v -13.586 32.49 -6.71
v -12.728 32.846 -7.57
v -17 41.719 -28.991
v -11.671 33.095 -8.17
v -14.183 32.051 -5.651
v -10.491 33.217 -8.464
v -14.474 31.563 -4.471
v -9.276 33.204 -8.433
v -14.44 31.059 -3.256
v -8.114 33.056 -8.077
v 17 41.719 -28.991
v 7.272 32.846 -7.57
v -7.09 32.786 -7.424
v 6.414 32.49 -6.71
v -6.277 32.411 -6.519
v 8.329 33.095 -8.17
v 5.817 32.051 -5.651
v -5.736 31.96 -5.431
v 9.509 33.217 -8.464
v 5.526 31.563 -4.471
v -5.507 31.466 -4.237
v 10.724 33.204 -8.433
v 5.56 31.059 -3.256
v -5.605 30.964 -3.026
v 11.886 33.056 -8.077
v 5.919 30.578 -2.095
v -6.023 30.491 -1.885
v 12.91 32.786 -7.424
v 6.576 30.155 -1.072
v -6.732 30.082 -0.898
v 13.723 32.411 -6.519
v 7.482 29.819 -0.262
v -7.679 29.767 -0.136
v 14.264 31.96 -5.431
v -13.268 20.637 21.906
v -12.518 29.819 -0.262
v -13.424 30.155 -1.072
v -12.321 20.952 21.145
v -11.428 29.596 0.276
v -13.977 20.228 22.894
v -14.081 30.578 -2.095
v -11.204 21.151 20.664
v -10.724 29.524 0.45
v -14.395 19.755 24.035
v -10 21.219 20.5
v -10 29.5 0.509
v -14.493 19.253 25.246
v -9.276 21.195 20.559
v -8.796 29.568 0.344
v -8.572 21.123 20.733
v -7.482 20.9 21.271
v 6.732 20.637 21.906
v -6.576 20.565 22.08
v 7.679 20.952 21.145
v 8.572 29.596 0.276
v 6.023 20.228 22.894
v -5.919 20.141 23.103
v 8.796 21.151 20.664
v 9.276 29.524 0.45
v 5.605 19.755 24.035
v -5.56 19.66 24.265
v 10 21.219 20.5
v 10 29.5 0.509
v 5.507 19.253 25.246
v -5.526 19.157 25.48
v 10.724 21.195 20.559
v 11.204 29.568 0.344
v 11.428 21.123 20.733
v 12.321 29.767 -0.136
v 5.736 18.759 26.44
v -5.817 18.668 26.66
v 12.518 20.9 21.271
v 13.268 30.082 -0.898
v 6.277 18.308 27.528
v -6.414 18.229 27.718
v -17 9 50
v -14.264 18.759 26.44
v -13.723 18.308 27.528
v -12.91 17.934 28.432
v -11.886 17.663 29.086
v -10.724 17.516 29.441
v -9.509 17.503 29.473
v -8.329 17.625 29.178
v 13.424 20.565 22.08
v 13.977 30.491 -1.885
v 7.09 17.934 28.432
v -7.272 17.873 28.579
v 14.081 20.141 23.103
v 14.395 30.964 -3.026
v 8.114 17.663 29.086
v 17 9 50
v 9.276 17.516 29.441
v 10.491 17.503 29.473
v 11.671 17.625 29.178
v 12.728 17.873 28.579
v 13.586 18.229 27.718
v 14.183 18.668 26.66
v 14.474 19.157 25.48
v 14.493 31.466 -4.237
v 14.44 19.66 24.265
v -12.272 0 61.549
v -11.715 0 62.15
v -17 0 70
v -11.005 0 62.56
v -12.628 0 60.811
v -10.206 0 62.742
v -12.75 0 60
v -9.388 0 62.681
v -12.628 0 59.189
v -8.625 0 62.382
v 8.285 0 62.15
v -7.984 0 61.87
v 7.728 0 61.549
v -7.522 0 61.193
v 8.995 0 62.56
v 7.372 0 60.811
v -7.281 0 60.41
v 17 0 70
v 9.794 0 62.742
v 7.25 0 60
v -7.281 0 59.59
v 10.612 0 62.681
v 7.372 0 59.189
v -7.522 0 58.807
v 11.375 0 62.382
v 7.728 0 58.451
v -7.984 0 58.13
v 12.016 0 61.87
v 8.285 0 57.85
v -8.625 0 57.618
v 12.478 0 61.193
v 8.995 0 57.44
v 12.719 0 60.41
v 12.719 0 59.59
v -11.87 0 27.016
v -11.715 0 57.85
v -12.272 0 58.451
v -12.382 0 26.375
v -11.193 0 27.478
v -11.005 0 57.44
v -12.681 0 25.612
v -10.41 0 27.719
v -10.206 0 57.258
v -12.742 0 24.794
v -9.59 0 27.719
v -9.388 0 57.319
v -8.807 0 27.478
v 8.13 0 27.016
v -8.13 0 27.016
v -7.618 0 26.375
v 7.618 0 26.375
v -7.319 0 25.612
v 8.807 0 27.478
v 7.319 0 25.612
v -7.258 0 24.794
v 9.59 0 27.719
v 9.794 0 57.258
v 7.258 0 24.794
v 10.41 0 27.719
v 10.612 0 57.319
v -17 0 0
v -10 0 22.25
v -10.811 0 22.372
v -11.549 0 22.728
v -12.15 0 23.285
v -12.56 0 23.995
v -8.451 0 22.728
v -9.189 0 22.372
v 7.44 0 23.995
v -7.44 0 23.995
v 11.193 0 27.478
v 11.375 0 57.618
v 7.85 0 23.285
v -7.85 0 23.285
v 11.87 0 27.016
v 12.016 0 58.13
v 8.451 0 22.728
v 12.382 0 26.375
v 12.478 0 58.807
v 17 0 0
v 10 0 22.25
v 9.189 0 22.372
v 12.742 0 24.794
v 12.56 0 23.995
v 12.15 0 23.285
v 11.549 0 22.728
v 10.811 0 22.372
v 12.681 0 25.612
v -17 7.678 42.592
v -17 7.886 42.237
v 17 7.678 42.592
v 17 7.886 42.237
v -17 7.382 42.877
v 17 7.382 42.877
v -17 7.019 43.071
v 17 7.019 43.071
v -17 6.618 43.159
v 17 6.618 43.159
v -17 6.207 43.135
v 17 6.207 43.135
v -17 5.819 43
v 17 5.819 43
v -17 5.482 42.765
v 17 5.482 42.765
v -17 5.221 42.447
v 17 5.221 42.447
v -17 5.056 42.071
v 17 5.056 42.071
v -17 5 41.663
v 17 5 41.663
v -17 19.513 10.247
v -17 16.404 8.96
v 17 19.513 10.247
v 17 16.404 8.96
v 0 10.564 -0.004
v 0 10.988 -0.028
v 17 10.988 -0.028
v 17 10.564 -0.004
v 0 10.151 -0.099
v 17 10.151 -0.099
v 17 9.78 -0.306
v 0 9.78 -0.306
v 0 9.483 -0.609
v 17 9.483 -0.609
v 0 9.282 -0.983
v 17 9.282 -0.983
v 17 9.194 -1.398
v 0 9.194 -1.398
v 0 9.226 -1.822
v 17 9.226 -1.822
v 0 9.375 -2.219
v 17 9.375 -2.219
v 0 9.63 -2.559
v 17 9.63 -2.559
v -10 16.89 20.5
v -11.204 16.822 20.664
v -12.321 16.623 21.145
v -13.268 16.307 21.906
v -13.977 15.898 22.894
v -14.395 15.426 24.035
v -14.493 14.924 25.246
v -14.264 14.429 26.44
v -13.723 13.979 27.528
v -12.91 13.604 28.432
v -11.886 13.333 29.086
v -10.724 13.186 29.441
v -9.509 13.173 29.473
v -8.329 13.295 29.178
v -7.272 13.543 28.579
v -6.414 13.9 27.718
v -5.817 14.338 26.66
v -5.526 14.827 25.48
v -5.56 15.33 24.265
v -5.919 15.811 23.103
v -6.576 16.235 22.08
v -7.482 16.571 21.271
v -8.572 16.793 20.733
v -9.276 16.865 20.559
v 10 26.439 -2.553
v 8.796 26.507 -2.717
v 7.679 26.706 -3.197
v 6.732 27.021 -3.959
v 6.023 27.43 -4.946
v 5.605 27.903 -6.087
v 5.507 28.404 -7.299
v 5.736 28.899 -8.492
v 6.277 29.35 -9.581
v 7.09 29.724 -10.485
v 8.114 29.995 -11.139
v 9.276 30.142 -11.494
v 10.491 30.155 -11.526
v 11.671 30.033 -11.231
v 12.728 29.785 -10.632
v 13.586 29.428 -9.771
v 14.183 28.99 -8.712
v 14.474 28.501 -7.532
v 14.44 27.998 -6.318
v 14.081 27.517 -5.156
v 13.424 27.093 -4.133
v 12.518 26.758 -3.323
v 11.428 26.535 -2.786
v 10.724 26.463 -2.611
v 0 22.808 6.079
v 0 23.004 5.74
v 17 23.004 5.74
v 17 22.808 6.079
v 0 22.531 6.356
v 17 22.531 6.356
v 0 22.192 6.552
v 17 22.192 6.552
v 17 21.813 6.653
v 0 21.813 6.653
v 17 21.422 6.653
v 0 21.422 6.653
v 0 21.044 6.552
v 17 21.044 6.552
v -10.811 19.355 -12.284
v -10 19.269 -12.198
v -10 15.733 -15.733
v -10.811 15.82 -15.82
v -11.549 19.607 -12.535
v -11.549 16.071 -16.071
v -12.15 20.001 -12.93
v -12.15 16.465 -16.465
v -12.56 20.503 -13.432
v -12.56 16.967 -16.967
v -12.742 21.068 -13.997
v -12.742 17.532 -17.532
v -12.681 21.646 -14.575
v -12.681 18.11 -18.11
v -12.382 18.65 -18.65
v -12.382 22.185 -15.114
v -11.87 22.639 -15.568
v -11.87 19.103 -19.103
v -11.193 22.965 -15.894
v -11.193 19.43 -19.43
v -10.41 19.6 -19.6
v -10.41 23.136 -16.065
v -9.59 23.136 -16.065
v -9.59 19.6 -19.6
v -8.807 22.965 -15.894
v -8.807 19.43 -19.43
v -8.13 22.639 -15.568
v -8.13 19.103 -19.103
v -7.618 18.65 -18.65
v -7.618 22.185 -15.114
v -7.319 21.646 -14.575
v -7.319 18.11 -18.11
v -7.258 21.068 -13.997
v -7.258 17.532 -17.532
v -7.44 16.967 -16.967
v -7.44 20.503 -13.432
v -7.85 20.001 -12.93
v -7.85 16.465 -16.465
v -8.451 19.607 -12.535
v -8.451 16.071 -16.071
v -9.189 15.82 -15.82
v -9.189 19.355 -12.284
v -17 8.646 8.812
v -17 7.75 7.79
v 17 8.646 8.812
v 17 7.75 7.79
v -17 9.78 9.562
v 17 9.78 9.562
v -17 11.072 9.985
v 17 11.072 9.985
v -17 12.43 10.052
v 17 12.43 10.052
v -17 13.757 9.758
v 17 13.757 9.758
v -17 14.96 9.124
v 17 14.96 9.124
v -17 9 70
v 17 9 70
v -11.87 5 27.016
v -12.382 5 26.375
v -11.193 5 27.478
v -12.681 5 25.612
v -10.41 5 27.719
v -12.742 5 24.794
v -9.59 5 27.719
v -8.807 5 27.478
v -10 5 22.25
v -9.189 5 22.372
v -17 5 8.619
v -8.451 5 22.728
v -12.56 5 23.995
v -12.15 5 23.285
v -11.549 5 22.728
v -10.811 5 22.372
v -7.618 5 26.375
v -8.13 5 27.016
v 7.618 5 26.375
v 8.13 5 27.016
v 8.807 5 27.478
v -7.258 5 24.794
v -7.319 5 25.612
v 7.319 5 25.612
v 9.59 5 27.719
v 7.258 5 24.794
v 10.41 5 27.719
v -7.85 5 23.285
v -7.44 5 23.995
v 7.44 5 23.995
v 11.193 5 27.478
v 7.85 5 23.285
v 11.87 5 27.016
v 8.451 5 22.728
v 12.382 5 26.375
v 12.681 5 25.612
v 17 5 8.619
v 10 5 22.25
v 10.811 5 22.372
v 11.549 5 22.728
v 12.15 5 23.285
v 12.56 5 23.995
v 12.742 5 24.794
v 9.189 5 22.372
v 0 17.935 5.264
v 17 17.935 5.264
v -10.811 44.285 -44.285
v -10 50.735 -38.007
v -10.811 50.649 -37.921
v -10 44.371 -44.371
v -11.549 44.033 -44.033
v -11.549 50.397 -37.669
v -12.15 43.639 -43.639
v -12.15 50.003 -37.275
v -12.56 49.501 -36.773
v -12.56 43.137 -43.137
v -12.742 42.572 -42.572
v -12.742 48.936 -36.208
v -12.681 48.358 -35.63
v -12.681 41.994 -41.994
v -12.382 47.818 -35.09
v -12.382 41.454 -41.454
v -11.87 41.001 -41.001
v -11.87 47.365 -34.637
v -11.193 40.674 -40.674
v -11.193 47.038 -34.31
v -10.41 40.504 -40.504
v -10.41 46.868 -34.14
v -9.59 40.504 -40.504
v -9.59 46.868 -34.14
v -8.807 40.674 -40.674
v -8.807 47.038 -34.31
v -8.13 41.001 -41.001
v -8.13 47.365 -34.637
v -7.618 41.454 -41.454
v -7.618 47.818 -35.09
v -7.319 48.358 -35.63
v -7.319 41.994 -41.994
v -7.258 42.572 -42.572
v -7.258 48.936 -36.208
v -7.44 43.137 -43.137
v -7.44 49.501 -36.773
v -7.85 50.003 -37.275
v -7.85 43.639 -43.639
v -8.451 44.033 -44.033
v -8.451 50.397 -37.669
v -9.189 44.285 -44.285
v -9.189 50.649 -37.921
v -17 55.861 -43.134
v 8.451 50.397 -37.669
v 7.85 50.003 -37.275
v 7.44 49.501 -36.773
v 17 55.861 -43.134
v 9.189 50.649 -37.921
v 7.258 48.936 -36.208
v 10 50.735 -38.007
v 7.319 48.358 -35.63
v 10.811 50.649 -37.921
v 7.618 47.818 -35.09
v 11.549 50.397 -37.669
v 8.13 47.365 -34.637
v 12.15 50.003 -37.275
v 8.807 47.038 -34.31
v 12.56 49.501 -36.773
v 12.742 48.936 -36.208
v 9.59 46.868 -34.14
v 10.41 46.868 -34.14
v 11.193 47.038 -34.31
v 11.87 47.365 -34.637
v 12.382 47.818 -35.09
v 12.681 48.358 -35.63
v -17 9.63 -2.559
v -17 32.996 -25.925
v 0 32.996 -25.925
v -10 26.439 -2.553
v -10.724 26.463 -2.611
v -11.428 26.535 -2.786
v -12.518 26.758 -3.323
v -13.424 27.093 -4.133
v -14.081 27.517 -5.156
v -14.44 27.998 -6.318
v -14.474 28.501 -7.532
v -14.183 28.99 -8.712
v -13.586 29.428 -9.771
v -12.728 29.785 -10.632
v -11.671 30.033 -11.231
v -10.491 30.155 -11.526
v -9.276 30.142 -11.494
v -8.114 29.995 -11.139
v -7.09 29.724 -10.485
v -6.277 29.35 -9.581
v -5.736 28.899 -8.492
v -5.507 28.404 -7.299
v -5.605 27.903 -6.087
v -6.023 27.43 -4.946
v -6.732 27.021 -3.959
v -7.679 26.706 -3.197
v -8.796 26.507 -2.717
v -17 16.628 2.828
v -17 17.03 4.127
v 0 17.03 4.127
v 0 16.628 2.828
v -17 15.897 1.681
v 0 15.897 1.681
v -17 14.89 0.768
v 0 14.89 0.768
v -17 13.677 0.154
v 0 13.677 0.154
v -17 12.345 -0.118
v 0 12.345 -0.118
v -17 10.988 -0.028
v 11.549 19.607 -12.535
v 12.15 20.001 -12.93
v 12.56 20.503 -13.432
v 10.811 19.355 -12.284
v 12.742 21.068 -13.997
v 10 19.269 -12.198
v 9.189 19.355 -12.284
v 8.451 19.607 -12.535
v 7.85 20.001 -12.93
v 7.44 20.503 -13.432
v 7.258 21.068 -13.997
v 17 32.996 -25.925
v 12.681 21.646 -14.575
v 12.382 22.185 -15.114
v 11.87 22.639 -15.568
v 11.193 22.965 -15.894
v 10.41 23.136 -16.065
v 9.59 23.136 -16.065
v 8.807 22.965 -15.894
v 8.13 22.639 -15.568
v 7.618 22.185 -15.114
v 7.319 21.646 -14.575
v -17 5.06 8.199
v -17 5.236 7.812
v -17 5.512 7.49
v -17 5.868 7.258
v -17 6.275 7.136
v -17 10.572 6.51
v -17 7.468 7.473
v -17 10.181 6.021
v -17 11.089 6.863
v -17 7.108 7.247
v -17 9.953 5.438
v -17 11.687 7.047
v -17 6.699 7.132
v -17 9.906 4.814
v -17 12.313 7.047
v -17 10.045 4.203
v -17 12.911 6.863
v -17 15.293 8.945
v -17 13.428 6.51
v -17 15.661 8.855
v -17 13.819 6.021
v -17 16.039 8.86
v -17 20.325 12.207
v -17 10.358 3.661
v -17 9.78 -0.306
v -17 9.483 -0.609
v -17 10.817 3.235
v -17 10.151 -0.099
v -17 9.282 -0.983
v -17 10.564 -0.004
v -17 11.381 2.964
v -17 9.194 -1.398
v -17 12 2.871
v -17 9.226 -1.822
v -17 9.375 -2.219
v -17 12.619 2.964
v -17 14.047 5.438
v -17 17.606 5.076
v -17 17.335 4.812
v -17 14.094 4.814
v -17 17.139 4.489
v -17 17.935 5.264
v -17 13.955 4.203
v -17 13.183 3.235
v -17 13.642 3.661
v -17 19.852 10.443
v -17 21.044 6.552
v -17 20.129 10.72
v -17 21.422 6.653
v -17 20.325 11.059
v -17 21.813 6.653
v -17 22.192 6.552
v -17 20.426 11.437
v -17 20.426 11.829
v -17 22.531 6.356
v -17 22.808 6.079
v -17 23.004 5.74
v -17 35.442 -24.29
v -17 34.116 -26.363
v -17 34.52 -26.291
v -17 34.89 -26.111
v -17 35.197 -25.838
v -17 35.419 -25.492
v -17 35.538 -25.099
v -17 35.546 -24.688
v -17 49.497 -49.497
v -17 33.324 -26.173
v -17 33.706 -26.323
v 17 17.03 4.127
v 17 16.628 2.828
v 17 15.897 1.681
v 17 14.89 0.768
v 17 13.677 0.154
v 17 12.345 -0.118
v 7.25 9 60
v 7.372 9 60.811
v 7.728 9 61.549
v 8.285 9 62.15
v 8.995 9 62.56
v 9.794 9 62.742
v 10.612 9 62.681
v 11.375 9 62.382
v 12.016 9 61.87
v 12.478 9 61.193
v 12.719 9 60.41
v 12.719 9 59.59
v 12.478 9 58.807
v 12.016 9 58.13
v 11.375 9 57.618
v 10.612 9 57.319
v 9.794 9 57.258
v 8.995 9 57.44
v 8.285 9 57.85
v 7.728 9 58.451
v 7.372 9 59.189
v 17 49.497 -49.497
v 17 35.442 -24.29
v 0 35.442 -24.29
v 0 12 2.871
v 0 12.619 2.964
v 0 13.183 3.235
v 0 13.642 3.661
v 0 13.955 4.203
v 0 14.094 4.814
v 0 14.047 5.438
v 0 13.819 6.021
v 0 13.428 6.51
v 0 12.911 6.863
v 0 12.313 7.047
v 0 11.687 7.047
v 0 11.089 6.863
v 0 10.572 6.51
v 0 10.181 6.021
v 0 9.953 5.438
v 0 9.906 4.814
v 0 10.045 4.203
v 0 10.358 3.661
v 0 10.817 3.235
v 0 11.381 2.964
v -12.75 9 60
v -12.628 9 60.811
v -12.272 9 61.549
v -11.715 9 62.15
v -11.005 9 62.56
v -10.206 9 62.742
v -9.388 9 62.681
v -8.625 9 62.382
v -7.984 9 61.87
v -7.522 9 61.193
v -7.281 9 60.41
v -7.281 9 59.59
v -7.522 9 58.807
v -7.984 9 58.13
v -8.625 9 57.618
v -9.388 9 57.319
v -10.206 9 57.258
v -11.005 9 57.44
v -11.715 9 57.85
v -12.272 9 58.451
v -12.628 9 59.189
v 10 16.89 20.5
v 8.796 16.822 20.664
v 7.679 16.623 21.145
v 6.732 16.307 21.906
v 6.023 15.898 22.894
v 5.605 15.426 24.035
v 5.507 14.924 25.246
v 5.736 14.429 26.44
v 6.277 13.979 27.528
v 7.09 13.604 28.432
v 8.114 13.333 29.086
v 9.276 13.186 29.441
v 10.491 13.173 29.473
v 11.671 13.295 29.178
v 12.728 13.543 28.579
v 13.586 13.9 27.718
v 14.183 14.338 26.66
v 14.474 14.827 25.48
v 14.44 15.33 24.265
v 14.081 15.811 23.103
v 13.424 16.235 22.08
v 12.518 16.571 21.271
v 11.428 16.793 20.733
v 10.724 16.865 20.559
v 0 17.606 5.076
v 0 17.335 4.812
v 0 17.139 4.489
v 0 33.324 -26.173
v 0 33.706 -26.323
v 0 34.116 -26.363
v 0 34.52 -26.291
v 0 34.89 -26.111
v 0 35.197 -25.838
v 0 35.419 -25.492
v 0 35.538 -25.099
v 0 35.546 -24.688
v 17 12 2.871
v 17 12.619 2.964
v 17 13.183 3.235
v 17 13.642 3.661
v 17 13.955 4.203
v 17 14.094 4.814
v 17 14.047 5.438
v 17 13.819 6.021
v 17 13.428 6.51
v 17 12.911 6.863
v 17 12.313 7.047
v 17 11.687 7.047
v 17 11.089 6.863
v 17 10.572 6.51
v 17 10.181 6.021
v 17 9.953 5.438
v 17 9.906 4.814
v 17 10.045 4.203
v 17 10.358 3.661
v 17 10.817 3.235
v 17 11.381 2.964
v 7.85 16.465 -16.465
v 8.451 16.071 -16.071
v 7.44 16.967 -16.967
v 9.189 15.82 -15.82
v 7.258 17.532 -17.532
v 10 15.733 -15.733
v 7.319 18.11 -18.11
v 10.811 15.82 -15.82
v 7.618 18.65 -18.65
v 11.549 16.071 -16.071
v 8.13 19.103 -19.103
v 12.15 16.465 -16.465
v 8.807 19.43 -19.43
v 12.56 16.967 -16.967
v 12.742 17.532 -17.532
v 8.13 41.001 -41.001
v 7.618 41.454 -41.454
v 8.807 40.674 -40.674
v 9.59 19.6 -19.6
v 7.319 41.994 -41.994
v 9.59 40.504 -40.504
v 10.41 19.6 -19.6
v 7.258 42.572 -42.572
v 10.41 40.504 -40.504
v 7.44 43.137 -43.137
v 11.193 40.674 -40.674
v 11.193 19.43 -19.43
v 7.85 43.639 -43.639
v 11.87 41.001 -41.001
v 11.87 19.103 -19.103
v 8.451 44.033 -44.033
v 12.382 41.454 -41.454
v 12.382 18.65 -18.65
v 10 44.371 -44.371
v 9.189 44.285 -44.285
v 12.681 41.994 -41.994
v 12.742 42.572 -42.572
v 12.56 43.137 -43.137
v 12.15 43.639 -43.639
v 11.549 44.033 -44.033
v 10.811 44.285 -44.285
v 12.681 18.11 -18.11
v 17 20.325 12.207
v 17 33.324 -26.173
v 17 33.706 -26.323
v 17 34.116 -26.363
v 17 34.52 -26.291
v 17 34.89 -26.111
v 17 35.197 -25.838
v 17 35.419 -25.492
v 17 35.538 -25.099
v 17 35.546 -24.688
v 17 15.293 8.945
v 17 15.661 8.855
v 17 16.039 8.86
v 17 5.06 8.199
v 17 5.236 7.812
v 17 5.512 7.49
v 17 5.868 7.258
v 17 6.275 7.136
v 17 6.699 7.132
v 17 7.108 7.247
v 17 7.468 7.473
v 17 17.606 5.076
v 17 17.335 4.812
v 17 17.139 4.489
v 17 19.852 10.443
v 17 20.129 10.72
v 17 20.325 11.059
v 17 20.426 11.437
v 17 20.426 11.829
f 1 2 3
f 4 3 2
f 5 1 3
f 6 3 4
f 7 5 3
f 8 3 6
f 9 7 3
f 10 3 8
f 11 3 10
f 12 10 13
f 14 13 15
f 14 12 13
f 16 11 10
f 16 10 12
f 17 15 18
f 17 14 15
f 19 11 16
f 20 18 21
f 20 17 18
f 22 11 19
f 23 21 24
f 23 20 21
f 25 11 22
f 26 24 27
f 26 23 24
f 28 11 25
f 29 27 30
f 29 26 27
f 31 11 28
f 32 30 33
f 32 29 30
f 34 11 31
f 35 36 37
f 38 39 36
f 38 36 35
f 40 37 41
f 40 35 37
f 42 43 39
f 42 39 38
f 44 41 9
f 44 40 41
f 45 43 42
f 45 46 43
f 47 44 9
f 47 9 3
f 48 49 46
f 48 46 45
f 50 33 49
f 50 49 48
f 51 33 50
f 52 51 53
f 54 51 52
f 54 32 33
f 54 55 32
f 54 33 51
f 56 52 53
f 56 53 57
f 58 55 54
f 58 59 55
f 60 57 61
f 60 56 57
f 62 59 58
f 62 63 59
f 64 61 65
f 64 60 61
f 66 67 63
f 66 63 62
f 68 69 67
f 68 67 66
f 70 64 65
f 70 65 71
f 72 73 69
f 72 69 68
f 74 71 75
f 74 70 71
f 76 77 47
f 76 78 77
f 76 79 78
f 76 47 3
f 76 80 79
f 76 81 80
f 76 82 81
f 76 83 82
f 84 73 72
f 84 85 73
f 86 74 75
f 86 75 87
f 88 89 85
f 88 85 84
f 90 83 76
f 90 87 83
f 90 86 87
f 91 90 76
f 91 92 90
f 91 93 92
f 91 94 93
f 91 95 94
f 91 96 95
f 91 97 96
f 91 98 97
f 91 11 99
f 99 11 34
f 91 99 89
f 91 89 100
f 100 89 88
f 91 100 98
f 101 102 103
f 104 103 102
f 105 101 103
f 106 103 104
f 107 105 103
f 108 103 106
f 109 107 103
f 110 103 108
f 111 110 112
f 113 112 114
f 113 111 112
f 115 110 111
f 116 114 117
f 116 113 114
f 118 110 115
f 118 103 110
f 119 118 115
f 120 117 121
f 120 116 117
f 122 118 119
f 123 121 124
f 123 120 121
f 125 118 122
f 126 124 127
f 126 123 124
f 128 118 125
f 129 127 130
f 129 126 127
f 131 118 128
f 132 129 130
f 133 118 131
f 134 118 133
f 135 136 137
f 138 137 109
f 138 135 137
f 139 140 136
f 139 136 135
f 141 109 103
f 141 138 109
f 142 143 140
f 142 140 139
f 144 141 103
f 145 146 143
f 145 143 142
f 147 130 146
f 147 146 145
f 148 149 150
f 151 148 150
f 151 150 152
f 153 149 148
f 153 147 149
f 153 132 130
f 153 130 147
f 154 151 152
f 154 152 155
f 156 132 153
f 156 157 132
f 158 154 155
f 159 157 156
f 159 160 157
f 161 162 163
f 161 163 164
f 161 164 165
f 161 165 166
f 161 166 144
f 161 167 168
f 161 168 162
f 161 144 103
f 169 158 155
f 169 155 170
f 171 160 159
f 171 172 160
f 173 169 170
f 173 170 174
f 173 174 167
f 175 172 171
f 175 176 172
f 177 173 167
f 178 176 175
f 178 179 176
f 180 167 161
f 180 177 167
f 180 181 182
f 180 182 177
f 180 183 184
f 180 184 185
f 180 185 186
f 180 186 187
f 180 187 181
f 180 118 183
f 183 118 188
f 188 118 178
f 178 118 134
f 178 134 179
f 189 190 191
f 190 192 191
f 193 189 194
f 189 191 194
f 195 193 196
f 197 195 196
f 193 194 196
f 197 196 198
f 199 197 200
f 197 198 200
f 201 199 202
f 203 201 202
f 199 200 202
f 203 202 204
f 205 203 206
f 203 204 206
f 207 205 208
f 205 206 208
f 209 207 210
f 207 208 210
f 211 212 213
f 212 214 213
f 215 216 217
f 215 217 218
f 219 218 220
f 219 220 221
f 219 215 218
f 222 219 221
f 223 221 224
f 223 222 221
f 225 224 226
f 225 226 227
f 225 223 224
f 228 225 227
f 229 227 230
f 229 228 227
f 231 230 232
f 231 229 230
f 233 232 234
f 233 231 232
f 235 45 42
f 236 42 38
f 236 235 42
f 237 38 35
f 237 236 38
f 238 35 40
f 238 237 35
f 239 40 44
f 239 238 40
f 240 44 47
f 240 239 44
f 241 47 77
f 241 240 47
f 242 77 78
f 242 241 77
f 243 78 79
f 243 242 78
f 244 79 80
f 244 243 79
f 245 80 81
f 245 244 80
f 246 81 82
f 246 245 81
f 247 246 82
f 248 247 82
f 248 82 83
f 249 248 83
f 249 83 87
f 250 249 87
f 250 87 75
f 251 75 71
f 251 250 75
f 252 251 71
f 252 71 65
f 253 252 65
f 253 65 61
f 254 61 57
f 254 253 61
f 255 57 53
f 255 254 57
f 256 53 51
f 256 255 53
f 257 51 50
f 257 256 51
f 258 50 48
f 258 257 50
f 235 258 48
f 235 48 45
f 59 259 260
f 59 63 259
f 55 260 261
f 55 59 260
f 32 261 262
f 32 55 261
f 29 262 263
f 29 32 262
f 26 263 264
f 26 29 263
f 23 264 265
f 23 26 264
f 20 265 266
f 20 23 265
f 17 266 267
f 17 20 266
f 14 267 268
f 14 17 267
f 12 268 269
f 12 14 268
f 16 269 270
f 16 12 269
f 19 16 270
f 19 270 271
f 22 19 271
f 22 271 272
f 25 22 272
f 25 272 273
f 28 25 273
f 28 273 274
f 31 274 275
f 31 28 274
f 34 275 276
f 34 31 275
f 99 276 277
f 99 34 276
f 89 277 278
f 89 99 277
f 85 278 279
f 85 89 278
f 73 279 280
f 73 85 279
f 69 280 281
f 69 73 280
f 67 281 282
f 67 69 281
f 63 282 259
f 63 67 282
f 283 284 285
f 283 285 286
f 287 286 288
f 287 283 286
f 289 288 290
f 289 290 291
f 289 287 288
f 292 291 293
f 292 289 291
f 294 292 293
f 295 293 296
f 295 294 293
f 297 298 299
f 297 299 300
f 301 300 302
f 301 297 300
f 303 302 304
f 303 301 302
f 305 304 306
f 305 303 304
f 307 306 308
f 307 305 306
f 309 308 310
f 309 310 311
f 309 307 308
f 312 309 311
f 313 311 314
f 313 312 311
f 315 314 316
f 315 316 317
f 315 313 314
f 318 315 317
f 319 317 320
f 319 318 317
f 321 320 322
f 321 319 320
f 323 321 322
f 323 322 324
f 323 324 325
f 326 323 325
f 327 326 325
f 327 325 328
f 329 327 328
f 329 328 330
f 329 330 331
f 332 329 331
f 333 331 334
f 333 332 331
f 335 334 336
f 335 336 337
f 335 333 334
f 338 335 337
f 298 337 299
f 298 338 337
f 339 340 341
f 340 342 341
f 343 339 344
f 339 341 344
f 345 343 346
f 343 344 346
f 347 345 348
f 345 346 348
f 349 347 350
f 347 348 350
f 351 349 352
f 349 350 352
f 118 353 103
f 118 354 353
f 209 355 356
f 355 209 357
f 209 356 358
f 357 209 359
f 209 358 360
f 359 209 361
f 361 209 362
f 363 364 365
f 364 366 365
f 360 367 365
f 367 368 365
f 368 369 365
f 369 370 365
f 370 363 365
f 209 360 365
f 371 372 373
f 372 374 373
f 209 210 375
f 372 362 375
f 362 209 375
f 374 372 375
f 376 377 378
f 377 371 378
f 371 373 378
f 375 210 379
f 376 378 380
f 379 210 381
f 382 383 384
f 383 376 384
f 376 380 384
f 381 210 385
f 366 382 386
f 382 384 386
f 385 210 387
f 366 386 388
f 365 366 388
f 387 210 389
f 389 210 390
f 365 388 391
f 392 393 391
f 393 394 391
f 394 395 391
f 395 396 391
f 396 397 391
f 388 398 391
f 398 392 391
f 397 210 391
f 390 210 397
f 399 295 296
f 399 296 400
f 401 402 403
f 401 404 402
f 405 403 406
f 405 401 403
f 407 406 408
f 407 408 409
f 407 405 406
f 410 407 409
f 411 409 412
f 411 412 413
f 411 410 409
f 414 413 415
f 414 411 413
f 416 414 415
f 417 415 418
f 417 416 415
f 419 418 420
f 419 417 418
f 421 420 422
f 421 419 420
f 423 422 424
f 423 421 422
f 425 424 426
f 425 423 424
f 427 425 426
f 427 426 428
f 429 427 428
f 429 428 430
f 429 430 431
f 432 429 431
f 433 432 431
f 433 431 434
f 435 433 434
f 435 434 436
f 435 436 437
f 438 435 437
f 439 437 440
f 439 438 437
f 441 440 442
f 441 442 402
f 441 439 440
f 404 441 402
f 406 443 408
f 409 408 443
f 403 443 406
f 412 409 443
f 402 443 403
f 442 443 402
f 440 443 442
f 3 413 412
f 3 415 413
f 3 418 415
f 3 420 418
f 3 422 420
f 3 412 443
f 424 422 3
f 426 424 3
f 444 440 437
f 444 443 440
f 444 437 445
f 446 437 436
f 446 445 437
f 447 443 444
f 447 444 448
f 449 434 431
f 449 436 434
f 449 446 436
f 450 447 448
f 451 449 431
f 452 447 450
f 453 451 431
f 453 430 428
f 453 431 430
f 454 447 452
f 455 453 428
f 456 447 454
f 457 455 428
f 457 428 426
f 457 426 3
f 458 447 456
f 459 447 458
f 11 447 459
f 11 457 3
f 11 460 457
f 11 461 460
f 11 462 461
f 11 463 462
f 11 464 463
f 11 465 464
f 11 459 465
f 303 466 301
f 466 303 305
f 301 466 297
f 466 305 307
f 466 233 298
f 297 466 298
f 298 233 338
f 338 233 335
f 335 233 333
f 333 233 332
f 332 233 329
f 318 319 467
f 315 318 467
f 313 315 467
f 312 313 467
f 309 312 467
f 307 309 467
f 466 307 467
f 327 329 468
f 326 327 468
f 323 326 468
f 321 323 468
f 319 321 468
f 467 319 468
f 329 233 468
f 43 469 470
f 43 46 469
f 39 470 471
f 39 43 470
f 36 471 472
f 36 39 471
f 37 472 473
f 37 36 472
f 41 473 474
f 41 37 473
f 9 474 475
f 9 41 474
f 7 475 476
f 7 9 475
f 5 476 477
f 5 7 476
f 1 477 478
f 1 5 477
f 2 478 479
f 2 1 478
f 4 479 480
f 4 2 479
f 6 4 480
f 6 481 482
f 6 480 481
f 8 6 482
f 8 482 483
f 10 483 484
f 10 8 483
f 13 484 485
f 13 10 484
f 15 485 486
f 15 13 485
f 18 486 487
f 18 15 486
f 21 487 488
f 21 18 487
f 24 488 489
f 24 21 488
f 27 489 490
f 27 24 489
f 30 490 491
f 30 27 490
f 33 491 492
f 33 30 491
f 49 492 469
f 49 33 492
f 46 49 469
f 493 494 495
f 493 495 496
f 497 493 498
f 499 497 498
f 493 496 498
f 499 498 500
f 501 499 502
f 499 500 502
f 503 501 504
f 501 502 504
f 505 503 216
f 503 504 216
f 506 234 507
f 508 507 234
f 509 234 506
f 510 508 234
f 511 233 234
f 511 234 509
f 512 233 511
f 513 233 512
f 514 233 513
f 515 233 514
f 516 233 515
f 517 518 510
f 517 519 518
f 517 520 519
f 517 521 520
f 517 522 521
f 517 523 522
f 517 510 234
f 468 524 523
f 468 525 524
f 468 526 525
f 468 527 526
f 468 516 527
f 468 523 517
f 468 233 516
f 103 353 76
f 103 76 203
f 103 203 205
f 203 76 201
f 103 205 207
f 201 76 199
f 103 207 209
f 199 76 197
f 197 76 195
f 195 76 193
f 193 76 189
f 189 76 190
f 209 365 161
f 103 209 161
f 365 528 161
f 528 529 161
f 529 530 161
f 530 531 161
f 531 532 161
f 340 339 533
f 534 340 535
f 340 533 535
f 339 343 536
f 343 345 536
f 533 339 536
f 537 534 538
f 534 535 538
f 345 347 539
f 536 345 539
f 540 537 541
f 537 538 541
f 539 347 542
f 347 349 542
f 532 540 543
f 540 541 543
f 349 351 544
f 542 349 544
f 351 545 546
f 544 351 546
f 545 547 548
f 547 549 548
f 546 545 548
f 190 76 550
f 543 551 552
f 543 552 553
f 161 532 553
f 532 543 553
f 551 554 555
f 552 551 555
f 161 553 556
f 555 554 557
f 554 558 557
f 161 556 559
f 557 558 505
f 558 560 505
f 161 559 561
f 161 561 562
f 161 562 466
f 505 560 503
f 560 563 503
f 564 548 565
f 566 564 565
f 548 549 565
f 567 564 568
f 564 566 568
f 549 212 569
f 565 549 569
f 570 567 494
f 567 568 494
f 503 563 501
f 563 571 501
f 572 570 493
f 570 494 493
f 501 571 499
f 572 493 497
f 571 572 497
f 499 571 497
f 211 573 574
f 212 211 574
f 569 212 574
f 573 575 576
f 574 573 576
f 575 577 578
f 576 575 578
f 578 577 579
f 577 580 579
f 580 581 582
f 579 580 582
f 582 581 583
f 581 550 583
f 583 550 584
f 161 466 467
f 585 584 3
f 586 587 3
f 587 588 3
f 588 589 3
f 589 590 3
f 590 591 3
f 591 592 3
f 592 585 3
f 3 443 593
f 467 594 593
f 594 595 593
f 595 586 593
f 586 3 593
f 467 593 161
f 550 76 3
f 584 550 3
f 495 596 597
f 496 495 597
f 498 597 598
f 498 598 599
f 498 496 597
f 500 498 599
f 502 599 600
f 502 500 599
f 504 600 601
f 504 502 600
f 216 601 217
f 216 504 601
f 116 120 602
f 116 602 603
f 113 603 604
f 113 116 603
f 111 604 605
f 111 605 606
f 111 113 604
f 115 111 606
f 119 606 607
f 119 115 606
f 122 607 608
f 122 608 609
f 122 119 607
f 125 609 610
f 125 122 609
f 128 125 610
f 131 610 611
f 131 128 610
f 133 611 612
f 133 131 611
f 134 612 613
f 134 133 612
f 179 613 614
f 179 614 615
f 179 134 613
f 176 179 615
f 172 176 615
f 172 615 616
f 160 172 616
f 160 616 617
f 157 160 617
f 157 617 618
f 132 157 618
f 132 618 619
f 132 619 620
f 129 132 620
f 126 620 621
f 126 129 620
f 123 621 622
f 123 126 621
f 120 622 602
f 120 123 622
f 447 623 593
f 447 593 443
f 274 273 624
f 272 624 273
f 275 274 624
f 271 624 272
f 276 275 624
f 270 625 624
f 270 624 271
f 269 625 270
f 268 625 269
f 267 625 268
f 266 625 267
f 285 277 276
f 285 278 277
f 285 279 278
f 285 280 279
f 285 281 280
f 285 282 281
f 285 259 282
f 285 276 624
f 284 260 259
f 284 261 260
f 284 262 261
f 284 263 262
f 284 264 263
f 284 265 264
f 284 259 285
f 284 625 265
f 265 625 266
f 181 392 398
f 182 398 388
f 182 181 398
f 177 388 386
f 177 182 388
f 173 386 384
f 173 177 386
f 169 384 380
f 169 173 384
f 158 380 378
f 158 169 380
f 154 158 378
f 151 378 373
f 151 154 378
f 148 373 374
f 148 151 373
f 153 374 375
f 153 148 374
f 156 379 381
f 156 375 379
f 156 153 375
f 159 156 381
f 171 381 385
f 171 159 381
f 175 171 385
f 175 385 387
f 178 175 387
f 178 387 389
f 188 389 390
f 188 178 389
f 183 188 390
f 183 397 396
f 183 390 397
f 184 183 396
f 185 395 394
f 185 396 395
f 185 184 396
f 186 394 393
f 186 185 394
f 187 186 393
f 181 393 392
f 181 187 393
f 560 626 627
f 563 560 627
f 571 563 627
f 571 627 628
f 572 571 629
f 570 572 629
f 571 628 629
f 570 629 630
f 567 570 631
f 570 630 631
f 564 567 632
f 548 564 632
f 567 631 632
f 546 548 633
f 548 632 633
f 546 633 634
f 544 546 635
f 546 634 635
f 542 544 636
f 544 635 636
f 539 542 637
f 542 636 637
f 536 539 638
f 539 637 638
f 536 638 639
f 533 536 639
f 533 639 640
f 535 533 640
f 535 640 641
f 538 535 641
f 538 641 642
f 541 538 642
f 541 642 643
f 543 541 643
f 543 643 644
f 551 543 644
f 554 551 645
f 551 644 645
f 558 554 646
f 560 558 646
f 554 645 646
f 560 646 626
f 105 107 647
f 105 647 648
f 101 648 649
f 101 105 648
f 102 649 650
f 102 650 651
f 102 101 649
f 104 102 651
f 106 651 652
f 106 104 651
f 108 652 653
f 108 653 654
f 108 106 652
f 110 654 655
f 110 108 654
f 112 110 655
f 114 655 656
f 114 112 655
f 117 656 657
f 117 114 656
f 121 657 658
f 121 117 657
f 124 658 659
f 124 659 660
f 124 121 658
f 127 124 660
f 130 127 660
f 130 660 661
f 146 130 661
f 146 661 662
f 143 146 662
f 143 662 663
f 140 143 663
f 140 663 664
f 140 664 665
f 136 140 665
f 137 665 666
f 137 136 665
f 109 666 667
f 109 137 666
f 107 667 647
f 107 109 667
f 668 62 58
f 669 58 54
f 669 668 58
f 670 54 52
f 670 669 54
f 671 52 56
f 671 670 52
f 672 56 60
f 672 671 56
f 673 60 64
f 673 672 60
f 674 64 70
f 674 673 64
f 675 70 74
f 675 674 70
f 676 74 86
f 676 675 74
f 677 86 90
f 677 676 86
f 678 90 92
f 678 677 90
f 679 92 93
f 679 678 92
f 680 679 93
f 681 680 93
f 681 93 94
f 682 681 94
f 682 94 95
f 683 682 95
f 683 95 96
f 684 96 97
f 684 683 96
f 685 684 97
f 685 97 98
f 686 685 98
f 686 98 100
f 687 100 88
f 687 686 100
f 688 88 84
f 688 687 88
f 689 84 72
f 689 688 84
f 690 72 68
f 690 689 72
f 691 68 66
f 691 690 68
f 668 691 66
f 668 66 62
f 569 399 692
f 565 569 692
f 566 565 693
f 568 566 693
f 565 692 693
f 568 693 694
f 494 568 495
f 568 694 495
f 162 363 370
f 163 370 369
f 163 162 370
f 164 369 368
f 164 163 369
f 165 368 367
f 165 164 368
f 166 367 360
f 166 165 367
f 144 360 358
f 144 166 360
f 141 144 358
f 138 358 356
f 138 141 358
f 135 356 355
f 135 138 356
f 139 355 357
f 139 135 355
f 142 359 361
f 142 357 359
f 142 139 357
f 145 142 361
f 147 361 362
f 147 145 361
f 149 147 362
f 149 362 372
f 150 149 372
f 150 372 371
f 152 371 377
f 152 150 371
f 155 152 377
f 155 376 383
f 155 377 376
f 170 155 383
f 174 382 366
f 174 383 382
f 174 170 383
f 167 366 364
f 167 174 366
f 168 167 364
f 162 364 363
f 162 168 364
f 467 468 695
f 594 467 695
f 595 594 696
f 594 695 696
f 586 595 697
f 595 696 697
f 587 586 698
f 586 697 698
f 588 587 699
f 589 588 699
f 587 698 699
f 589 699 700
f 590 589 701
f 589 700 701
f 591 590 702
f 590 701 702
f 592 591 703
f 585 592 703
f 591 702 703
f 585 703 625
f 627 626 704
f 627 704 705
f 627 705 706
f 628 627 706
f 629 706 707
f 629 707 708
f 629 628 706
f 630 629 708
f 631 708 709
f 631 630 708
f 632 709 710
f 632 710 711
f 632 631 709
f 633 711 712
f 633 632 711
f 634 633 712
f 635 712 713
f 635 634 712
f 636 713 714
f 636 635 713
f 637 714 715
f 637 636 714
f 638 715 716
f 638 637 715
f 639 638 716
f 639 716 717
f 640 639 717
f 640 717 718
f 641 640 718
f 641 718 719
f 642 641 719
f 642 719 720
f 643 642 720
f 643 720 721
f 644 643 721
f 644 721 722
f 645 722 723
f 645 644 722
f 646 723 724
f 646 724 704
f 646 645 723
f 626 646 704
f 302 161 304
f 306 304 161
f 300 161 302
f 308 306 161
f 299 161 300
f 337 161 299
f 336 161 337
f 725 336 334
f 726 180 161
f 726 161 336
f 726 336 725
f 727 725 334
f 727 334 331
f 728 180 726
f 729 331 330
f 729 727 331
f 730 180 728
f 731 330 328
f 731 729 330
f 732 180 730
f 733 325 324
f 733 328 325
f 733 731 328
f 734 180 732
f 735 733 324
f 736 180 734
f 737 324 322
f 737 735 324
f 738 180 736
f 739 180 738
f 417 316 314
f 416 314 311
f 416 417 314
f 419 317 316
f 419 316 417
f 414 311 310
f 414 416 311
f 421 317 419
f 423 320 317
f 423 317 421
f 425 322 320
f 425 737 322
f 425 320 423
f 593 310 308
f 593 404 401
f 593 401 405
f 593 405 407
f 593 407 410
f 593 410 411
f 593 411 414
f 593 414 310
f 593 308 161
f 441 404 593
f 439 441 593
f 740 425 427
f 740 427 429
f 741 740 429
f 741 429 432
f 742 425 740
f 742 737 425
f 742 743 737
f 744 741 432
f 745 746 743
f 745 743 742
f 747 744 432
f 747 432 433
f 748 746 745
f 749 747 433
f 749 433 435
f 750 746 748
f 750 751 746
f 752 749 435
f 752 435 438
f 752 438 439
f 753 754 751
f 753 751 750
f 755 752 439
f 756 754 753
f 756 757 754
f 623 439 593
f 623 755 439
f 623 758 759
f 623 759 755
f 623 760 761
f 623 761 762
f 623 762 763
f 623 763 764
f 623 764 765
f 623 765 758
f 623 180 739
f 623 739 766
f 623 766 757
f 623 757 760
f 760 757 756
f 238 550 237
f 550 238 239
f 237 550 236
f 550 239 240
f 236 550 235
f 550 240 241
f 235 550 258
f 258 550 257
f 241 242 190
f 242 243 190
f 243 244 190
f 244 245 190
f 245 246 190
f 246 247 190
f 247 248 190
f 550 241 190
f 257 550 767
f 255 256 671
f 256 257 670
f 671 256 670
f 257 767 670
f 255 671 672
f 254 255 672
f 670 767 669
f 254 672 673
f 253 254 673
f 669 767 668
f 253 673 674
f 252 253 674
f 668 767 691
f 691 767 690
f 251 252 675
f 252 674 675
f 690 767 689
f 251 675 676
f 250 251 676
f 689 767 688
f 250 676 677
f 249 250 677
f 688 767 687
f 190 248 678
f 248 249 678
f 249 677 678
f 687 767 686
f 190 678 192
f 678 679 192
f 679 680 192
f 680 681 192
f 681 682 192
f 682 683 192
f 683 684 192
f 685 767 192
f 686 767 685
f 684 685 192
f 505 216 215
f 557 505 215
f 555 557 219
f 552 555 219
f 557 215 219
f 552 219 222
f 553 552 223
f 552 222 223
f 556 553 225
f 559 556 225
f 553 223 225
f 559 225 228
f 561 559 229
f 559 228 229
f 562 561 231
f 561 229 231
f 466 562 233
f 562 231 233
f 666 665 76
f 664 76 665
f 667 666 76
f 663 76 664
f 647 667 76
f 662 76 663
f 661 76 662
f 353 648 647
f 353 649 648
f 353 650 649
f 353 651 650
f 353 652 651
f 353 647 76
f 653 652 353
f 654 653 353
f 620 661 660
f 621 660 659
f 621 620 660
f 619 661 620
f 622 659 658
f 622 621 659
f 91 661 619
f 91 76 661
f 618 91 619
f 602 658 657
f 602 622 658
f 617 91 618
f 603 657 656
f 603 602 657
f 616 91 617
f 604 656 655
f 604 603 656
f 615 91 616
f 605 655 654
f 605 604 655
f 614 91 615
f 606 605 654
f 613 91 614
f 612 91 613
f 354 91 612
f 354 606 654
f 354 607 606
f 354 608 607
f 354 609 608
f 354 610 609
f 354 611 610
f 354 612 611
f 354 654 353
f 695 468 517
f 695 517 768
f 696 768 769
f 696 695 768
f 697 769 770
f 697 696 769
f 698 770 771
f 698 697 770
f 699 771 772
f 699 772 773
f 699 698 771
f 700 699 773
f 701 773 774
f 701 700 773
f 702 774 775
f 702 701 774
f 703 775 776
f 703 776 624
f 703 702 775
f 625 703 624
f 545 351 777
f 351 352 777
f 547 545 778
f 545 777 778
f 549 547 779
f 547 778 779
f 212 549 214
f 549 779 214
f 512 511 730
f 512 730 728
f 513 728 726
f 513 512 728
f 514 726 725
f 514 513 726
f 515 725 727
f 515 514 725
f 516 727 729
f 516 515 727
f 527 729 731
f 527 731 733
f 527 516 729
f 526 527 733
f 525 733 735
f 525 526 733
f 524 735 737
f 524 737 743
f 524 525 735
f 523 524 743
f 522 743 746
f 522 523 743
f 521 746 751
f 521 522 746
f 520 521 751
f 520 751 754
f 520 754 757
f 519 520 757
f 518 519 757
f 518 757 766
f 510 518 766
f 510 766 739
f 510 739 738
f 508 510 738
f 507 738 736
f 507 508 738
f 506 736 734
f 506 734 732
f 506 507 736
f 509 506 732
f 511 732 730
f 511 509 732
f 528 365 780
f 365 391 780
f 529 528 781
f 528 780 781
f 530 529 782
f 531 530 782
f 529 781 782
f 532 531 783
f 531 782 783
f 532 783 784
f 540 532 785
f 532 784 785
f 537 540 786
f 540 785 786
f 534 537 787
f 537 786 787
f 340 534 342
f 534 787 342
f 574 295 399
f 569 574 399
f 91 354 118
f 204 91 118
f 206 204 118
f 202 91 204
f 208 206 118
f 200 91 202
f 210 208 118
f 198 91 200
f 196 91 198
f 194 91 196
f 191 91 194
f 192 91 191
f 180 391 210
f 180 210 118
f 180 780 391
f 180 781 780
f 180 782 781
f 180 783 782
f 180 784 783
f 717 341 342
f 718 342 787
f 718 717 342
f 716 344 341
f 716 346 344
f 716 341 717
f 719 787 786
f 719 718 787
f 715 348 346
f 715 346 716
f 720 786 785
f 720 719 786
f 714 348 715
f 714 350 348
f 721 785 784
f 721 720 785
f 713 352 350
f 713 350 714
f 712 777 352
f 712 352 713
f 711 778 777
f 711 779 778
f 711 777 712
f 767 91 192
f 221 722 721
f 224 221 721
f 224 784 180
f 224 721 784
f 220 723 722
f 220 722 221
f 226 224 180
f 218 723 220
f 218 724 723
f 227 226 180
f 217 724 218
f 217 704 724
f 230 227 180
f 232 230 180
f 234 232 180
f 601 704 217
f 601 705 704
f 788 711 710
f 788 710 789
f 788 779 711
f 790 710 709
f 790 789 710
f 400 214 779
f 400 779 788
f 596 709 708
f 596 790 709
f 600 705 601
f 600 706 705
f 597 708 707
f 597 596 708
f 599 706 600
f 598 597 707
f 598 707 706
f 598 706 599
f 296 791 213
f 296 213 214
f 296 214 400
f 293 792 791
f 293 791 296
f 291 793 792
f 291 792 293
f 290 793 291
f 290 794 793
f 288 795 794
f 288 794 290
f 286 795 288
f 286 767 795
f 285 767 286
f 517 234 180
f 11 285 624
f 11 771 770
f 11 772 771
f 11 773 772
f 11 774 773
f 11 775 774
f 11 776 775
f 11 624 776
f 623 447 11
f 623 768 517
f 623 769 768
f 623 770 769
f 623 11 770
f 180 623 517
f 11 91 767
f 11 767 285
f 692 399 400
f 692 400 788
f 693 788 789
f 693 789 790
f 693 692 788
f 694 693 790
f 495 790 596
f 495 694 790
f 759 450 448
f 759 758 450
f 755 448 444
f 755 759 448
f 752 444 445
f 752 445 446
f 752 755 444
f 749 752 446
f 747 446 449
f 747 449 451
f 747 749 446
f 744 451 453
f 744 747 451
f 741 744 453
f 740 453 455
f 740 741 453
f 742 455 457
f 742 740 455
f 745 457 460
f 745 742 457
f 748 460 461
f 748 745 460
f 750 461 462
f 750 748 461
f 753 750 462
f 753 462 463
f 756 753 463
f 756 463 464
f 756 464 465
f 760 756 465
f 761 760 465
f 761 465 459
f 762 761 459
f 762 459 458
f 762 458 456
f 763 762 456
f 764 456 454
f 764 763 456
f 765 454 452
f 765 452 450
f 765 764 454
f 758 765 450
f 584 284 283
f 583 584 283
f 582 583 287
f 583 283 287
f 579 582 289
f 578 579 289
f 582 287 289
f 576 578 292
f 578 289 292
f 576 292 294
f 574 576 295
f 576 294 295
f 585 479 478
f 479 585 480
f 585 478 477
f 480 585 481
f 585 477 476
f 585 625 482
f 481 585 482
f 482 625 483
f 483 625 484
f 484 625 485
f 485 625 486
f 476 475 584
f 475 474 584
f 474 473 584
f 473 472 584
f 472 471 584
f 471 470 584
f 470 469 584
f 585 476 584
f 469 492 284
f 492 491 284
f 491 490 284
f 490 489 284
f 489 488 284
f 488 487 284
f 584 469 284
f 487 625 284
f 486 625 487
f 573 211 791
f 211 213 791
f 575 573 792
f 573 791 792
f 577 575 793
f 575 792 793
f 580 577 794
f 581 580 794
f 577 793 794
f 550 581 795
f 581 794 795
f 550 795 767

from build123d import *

# Parameters (mm, degrees)
BOSS_EXTRUDE1_DEPTH      = 17
BOSS_EXTRUDE1_DEPTH_BACK = 17
SKETCH1_R                = 2.1
SKETCH2_R                = 2.75
CUT_EXTRUDE1_DEPTH       = 9
SKETCH3_R                = 2.75
CUT_EXTRUDE2_DEPTH       = 9


with BuildPart() as part:
    # Sketch1 → Boss-Extrude1 (new, two sides: drawn at the far end of the back side and taken through both)
    with BuildSketch(Plane(origin=(0, 0, 0), x_dir=(0, 0, -1), z_dir=(1, 0, 0)).offset(-BOSS_EXTRUDE1_DEPTH_BACK)):
        Polygon((-70, 0), (0, 0), (49.497474683, 49.497474683), (43.133513652, 55.861435714), (28.991378029, 41.71930009), (-50, 9), (-70, 9), align=None)
        with Locations((-4.970562748, 12)):
            Circle(SKETCH1_R, mode=Mode.SUBTRACT)
        with BuildLine():
            Line((-6.551793043, 21.043679481), (-5.264121815, 17.934966139))
            ThreePointArc((-5.264121815, 17.934966139), (-4.812340099, 17.335290392), (-4.126543478, 17.029675086))
            ThreePointArc((-4.126543478, 17.029675086), (-0.768310337, 14.889822601), (0.028067769, 10.988222878))
            ThreePointArc((0.028067769, 10.988222878), (0.788934633, 9.368950353), (2.558913388, 9.6299812))
            Line((2.558913388, 9.6299812), (25.924897249, 32.995965061))
            ThreePointArc((25.924897249, 32.995965061), (26.111441495, 34.889980582), (24.290211928, 35.442444531))
            Line((24.290211928, 35.442444531), (-5.739998892, 23.003523928))
            ThreePointArc((-5.739998892, 23.003523928), (-6.551793043, 22.191729778), (-6.551793043, 21.043679481))
        make_face(mode=Mode.SUBTRACT)
        with BuildLine():
            Line((-41.663341292, 5), (-8.618850018, 5))
            ThreePointArc((-8.618850018, 5), (-7.182709356, 6.066987298), (-7.78969382, 7.75))
            ThreePointArc((-7.78969382, 7.75), (-9.985417083, 11.071971981), (-9.123891859, 14.959705611))
            ThreePointArc((-9.123891859, 14.959705611), (-8.855063072, 15.660739707), (-8.959639945, 16.40423241))
            Line((-8.959639945, 16.40423241), (-10.247311173, 19.512945751))
            ThreePointArc((-10.247311173, 19.512945751), (-11.059105323, 20.324739902), (-12.20715562, 20.324739902))
            Line((-12.20715562, 20.324739902), (-42.237366441, 7.885819299))
            ThreePointArc((-42.237366441, 7.885819299), (-43.134519213, 6.207364517), (-41.663341292, 5))
        make_face(mode=Mode.SUBTRACT)
    extrude(amount=BOSS_EXTRUDE1_DEPTH + BOSS_EXTRUDE1_DEPTH_BACK)

    # Sketch2 → Cut-Extrude1 (cut)
    with BuildSketch(Plane(origin=(0, 0, 0), x_dir=(-1, 0, 0), z_dir=(0, 1, 0))):
        with Locations((10, 60)):
            Circle(SKETCH2_R)
    extrude(amount=CUT_EXTRUDE1_DEPTH, mode=Mode.SUBTRACT)

    # Sketch3 → Cut-Extrude2 (cut)
    with BuildSketch(Plane(origin=(0, 0, 0), x_dir=(-1, 0, 0), z_dir=(0, 1, 0))):
        with Locations((-10, 60)):
            Circle(SKETCH3_R)
    extrude(amount=CUT_EXTRUDE2_DEPTH, mode=Mode.SUBTRACT)

    # Sketch4 → Cut-Revolve1 (revolve, cut)
    with BuildSketch(Plane(origin=(10, 0, 0), x_dir=(0, 0, -1), z_dir=(1, 0, 0))):
        Polygon((-25, 30), (-20.5, 30), (-20.5, 9), (-22.25, 9), (-22.25, 0), (-25, 0), align=None)
    revolve(axis=Axis((10, 0, 25), (0, 1, 0)), mode=Mode.SUBTRACT)

    # Sketch5 → Cut-Revolve2 (revolve, cut)
    with BuildSketch(Plane(origin=(10, 0, 0), x_dir=(0, 0, -1), z_dir=(1, 0, 0))):
        Polygon((17.67766953, 17.67766953), (15.733125881, 15.733125881), (9.369164851, 22.097086912), (8.131727984, 20.859650045), (-6.717514421, 35.70889245), (-3.535533906, 38.890872965), align=None)
    revolve(axis=Axis((10, 38.890872965, 3.535533906), (0, -0.7071067811865476, -0.7071067811865476)), mode=Mode.SUBTRACT)

    # Sketch6 → Cut-Revolve3 (revolve, cut)
    with BuildSketch(Plane(origin=(-10, 0, 0), x_dir=(0, 0, -1), z_dir=(1, 0, 0))):
        Polygon((-25, 30), (-20.5, 30), (-20.5, 9), (-22.25, 9), (-22.25, 0), (-25, 0), align=None)
    revolve(axis=Axis((-10, 0, 25), (0, 1, 0)), mode=Mode.SUBTRACT)

    # Sketch7 → Cut-Revolve4 (revolve, cut)
    with BuildSketch(Plane(origin=(-10, 0, 0), x_dir=(0, 0, -1), z_dir=(1, 0, 0))):
        Polygon((17.67766953, 17.67766953), (15.733125881, 15.733125881), (9.369164851, 22.097086912), (8.131727984, 20.859650045), (-6.717514421, 35.70889245), (-3.535533906, 38.890872965), align=None)
    revolve(axis=Axis((-10, 38.890872965, 3.535533906), (0, -0.7071067811865474, -0.7071067811865477)), mode=Mode.SUBTRACT)

    # Sketch8 → Cut-Revolve5 (revolve, cut)
    with BuildSketch(Plane(origin=(10, 0, 0), x_dir=(0, 0, -1), z_dir=(1, 0, 0))):
        Polygon((36.062445841, 48.790367902), (38.006989489, 50.73491155), (44.370950519, 44.370950519), (42.426406871, 42.426406871), align=None)
    revolve(axis=Axis((10, 42.426406871, -42.426406871), (0, 0.7071067811865476, 0.7071067811865476)), mode=Mode.SUBTRACT)

    # Sketch9 → Cut-Revolve6 (revolve, cut)
    with BuildSketch(Plane(origin=(-10, 0, 0), x_dir=(0, 0, -1), z_dir=(1, 0, 0))):
        Polygon((36.062445841, 48.790367902), (38.006989489, 50.73491155), (44.370950519, 44.370950519), (42.426406871, 42.426406871), align=None)
    revolve(axis=Axis((-10, 42.426406871, -42.426406871), (0, 0.7071067811865476, 0.7071067811865476)), mode=Mode.SUBTRACT)


solid = part.part
